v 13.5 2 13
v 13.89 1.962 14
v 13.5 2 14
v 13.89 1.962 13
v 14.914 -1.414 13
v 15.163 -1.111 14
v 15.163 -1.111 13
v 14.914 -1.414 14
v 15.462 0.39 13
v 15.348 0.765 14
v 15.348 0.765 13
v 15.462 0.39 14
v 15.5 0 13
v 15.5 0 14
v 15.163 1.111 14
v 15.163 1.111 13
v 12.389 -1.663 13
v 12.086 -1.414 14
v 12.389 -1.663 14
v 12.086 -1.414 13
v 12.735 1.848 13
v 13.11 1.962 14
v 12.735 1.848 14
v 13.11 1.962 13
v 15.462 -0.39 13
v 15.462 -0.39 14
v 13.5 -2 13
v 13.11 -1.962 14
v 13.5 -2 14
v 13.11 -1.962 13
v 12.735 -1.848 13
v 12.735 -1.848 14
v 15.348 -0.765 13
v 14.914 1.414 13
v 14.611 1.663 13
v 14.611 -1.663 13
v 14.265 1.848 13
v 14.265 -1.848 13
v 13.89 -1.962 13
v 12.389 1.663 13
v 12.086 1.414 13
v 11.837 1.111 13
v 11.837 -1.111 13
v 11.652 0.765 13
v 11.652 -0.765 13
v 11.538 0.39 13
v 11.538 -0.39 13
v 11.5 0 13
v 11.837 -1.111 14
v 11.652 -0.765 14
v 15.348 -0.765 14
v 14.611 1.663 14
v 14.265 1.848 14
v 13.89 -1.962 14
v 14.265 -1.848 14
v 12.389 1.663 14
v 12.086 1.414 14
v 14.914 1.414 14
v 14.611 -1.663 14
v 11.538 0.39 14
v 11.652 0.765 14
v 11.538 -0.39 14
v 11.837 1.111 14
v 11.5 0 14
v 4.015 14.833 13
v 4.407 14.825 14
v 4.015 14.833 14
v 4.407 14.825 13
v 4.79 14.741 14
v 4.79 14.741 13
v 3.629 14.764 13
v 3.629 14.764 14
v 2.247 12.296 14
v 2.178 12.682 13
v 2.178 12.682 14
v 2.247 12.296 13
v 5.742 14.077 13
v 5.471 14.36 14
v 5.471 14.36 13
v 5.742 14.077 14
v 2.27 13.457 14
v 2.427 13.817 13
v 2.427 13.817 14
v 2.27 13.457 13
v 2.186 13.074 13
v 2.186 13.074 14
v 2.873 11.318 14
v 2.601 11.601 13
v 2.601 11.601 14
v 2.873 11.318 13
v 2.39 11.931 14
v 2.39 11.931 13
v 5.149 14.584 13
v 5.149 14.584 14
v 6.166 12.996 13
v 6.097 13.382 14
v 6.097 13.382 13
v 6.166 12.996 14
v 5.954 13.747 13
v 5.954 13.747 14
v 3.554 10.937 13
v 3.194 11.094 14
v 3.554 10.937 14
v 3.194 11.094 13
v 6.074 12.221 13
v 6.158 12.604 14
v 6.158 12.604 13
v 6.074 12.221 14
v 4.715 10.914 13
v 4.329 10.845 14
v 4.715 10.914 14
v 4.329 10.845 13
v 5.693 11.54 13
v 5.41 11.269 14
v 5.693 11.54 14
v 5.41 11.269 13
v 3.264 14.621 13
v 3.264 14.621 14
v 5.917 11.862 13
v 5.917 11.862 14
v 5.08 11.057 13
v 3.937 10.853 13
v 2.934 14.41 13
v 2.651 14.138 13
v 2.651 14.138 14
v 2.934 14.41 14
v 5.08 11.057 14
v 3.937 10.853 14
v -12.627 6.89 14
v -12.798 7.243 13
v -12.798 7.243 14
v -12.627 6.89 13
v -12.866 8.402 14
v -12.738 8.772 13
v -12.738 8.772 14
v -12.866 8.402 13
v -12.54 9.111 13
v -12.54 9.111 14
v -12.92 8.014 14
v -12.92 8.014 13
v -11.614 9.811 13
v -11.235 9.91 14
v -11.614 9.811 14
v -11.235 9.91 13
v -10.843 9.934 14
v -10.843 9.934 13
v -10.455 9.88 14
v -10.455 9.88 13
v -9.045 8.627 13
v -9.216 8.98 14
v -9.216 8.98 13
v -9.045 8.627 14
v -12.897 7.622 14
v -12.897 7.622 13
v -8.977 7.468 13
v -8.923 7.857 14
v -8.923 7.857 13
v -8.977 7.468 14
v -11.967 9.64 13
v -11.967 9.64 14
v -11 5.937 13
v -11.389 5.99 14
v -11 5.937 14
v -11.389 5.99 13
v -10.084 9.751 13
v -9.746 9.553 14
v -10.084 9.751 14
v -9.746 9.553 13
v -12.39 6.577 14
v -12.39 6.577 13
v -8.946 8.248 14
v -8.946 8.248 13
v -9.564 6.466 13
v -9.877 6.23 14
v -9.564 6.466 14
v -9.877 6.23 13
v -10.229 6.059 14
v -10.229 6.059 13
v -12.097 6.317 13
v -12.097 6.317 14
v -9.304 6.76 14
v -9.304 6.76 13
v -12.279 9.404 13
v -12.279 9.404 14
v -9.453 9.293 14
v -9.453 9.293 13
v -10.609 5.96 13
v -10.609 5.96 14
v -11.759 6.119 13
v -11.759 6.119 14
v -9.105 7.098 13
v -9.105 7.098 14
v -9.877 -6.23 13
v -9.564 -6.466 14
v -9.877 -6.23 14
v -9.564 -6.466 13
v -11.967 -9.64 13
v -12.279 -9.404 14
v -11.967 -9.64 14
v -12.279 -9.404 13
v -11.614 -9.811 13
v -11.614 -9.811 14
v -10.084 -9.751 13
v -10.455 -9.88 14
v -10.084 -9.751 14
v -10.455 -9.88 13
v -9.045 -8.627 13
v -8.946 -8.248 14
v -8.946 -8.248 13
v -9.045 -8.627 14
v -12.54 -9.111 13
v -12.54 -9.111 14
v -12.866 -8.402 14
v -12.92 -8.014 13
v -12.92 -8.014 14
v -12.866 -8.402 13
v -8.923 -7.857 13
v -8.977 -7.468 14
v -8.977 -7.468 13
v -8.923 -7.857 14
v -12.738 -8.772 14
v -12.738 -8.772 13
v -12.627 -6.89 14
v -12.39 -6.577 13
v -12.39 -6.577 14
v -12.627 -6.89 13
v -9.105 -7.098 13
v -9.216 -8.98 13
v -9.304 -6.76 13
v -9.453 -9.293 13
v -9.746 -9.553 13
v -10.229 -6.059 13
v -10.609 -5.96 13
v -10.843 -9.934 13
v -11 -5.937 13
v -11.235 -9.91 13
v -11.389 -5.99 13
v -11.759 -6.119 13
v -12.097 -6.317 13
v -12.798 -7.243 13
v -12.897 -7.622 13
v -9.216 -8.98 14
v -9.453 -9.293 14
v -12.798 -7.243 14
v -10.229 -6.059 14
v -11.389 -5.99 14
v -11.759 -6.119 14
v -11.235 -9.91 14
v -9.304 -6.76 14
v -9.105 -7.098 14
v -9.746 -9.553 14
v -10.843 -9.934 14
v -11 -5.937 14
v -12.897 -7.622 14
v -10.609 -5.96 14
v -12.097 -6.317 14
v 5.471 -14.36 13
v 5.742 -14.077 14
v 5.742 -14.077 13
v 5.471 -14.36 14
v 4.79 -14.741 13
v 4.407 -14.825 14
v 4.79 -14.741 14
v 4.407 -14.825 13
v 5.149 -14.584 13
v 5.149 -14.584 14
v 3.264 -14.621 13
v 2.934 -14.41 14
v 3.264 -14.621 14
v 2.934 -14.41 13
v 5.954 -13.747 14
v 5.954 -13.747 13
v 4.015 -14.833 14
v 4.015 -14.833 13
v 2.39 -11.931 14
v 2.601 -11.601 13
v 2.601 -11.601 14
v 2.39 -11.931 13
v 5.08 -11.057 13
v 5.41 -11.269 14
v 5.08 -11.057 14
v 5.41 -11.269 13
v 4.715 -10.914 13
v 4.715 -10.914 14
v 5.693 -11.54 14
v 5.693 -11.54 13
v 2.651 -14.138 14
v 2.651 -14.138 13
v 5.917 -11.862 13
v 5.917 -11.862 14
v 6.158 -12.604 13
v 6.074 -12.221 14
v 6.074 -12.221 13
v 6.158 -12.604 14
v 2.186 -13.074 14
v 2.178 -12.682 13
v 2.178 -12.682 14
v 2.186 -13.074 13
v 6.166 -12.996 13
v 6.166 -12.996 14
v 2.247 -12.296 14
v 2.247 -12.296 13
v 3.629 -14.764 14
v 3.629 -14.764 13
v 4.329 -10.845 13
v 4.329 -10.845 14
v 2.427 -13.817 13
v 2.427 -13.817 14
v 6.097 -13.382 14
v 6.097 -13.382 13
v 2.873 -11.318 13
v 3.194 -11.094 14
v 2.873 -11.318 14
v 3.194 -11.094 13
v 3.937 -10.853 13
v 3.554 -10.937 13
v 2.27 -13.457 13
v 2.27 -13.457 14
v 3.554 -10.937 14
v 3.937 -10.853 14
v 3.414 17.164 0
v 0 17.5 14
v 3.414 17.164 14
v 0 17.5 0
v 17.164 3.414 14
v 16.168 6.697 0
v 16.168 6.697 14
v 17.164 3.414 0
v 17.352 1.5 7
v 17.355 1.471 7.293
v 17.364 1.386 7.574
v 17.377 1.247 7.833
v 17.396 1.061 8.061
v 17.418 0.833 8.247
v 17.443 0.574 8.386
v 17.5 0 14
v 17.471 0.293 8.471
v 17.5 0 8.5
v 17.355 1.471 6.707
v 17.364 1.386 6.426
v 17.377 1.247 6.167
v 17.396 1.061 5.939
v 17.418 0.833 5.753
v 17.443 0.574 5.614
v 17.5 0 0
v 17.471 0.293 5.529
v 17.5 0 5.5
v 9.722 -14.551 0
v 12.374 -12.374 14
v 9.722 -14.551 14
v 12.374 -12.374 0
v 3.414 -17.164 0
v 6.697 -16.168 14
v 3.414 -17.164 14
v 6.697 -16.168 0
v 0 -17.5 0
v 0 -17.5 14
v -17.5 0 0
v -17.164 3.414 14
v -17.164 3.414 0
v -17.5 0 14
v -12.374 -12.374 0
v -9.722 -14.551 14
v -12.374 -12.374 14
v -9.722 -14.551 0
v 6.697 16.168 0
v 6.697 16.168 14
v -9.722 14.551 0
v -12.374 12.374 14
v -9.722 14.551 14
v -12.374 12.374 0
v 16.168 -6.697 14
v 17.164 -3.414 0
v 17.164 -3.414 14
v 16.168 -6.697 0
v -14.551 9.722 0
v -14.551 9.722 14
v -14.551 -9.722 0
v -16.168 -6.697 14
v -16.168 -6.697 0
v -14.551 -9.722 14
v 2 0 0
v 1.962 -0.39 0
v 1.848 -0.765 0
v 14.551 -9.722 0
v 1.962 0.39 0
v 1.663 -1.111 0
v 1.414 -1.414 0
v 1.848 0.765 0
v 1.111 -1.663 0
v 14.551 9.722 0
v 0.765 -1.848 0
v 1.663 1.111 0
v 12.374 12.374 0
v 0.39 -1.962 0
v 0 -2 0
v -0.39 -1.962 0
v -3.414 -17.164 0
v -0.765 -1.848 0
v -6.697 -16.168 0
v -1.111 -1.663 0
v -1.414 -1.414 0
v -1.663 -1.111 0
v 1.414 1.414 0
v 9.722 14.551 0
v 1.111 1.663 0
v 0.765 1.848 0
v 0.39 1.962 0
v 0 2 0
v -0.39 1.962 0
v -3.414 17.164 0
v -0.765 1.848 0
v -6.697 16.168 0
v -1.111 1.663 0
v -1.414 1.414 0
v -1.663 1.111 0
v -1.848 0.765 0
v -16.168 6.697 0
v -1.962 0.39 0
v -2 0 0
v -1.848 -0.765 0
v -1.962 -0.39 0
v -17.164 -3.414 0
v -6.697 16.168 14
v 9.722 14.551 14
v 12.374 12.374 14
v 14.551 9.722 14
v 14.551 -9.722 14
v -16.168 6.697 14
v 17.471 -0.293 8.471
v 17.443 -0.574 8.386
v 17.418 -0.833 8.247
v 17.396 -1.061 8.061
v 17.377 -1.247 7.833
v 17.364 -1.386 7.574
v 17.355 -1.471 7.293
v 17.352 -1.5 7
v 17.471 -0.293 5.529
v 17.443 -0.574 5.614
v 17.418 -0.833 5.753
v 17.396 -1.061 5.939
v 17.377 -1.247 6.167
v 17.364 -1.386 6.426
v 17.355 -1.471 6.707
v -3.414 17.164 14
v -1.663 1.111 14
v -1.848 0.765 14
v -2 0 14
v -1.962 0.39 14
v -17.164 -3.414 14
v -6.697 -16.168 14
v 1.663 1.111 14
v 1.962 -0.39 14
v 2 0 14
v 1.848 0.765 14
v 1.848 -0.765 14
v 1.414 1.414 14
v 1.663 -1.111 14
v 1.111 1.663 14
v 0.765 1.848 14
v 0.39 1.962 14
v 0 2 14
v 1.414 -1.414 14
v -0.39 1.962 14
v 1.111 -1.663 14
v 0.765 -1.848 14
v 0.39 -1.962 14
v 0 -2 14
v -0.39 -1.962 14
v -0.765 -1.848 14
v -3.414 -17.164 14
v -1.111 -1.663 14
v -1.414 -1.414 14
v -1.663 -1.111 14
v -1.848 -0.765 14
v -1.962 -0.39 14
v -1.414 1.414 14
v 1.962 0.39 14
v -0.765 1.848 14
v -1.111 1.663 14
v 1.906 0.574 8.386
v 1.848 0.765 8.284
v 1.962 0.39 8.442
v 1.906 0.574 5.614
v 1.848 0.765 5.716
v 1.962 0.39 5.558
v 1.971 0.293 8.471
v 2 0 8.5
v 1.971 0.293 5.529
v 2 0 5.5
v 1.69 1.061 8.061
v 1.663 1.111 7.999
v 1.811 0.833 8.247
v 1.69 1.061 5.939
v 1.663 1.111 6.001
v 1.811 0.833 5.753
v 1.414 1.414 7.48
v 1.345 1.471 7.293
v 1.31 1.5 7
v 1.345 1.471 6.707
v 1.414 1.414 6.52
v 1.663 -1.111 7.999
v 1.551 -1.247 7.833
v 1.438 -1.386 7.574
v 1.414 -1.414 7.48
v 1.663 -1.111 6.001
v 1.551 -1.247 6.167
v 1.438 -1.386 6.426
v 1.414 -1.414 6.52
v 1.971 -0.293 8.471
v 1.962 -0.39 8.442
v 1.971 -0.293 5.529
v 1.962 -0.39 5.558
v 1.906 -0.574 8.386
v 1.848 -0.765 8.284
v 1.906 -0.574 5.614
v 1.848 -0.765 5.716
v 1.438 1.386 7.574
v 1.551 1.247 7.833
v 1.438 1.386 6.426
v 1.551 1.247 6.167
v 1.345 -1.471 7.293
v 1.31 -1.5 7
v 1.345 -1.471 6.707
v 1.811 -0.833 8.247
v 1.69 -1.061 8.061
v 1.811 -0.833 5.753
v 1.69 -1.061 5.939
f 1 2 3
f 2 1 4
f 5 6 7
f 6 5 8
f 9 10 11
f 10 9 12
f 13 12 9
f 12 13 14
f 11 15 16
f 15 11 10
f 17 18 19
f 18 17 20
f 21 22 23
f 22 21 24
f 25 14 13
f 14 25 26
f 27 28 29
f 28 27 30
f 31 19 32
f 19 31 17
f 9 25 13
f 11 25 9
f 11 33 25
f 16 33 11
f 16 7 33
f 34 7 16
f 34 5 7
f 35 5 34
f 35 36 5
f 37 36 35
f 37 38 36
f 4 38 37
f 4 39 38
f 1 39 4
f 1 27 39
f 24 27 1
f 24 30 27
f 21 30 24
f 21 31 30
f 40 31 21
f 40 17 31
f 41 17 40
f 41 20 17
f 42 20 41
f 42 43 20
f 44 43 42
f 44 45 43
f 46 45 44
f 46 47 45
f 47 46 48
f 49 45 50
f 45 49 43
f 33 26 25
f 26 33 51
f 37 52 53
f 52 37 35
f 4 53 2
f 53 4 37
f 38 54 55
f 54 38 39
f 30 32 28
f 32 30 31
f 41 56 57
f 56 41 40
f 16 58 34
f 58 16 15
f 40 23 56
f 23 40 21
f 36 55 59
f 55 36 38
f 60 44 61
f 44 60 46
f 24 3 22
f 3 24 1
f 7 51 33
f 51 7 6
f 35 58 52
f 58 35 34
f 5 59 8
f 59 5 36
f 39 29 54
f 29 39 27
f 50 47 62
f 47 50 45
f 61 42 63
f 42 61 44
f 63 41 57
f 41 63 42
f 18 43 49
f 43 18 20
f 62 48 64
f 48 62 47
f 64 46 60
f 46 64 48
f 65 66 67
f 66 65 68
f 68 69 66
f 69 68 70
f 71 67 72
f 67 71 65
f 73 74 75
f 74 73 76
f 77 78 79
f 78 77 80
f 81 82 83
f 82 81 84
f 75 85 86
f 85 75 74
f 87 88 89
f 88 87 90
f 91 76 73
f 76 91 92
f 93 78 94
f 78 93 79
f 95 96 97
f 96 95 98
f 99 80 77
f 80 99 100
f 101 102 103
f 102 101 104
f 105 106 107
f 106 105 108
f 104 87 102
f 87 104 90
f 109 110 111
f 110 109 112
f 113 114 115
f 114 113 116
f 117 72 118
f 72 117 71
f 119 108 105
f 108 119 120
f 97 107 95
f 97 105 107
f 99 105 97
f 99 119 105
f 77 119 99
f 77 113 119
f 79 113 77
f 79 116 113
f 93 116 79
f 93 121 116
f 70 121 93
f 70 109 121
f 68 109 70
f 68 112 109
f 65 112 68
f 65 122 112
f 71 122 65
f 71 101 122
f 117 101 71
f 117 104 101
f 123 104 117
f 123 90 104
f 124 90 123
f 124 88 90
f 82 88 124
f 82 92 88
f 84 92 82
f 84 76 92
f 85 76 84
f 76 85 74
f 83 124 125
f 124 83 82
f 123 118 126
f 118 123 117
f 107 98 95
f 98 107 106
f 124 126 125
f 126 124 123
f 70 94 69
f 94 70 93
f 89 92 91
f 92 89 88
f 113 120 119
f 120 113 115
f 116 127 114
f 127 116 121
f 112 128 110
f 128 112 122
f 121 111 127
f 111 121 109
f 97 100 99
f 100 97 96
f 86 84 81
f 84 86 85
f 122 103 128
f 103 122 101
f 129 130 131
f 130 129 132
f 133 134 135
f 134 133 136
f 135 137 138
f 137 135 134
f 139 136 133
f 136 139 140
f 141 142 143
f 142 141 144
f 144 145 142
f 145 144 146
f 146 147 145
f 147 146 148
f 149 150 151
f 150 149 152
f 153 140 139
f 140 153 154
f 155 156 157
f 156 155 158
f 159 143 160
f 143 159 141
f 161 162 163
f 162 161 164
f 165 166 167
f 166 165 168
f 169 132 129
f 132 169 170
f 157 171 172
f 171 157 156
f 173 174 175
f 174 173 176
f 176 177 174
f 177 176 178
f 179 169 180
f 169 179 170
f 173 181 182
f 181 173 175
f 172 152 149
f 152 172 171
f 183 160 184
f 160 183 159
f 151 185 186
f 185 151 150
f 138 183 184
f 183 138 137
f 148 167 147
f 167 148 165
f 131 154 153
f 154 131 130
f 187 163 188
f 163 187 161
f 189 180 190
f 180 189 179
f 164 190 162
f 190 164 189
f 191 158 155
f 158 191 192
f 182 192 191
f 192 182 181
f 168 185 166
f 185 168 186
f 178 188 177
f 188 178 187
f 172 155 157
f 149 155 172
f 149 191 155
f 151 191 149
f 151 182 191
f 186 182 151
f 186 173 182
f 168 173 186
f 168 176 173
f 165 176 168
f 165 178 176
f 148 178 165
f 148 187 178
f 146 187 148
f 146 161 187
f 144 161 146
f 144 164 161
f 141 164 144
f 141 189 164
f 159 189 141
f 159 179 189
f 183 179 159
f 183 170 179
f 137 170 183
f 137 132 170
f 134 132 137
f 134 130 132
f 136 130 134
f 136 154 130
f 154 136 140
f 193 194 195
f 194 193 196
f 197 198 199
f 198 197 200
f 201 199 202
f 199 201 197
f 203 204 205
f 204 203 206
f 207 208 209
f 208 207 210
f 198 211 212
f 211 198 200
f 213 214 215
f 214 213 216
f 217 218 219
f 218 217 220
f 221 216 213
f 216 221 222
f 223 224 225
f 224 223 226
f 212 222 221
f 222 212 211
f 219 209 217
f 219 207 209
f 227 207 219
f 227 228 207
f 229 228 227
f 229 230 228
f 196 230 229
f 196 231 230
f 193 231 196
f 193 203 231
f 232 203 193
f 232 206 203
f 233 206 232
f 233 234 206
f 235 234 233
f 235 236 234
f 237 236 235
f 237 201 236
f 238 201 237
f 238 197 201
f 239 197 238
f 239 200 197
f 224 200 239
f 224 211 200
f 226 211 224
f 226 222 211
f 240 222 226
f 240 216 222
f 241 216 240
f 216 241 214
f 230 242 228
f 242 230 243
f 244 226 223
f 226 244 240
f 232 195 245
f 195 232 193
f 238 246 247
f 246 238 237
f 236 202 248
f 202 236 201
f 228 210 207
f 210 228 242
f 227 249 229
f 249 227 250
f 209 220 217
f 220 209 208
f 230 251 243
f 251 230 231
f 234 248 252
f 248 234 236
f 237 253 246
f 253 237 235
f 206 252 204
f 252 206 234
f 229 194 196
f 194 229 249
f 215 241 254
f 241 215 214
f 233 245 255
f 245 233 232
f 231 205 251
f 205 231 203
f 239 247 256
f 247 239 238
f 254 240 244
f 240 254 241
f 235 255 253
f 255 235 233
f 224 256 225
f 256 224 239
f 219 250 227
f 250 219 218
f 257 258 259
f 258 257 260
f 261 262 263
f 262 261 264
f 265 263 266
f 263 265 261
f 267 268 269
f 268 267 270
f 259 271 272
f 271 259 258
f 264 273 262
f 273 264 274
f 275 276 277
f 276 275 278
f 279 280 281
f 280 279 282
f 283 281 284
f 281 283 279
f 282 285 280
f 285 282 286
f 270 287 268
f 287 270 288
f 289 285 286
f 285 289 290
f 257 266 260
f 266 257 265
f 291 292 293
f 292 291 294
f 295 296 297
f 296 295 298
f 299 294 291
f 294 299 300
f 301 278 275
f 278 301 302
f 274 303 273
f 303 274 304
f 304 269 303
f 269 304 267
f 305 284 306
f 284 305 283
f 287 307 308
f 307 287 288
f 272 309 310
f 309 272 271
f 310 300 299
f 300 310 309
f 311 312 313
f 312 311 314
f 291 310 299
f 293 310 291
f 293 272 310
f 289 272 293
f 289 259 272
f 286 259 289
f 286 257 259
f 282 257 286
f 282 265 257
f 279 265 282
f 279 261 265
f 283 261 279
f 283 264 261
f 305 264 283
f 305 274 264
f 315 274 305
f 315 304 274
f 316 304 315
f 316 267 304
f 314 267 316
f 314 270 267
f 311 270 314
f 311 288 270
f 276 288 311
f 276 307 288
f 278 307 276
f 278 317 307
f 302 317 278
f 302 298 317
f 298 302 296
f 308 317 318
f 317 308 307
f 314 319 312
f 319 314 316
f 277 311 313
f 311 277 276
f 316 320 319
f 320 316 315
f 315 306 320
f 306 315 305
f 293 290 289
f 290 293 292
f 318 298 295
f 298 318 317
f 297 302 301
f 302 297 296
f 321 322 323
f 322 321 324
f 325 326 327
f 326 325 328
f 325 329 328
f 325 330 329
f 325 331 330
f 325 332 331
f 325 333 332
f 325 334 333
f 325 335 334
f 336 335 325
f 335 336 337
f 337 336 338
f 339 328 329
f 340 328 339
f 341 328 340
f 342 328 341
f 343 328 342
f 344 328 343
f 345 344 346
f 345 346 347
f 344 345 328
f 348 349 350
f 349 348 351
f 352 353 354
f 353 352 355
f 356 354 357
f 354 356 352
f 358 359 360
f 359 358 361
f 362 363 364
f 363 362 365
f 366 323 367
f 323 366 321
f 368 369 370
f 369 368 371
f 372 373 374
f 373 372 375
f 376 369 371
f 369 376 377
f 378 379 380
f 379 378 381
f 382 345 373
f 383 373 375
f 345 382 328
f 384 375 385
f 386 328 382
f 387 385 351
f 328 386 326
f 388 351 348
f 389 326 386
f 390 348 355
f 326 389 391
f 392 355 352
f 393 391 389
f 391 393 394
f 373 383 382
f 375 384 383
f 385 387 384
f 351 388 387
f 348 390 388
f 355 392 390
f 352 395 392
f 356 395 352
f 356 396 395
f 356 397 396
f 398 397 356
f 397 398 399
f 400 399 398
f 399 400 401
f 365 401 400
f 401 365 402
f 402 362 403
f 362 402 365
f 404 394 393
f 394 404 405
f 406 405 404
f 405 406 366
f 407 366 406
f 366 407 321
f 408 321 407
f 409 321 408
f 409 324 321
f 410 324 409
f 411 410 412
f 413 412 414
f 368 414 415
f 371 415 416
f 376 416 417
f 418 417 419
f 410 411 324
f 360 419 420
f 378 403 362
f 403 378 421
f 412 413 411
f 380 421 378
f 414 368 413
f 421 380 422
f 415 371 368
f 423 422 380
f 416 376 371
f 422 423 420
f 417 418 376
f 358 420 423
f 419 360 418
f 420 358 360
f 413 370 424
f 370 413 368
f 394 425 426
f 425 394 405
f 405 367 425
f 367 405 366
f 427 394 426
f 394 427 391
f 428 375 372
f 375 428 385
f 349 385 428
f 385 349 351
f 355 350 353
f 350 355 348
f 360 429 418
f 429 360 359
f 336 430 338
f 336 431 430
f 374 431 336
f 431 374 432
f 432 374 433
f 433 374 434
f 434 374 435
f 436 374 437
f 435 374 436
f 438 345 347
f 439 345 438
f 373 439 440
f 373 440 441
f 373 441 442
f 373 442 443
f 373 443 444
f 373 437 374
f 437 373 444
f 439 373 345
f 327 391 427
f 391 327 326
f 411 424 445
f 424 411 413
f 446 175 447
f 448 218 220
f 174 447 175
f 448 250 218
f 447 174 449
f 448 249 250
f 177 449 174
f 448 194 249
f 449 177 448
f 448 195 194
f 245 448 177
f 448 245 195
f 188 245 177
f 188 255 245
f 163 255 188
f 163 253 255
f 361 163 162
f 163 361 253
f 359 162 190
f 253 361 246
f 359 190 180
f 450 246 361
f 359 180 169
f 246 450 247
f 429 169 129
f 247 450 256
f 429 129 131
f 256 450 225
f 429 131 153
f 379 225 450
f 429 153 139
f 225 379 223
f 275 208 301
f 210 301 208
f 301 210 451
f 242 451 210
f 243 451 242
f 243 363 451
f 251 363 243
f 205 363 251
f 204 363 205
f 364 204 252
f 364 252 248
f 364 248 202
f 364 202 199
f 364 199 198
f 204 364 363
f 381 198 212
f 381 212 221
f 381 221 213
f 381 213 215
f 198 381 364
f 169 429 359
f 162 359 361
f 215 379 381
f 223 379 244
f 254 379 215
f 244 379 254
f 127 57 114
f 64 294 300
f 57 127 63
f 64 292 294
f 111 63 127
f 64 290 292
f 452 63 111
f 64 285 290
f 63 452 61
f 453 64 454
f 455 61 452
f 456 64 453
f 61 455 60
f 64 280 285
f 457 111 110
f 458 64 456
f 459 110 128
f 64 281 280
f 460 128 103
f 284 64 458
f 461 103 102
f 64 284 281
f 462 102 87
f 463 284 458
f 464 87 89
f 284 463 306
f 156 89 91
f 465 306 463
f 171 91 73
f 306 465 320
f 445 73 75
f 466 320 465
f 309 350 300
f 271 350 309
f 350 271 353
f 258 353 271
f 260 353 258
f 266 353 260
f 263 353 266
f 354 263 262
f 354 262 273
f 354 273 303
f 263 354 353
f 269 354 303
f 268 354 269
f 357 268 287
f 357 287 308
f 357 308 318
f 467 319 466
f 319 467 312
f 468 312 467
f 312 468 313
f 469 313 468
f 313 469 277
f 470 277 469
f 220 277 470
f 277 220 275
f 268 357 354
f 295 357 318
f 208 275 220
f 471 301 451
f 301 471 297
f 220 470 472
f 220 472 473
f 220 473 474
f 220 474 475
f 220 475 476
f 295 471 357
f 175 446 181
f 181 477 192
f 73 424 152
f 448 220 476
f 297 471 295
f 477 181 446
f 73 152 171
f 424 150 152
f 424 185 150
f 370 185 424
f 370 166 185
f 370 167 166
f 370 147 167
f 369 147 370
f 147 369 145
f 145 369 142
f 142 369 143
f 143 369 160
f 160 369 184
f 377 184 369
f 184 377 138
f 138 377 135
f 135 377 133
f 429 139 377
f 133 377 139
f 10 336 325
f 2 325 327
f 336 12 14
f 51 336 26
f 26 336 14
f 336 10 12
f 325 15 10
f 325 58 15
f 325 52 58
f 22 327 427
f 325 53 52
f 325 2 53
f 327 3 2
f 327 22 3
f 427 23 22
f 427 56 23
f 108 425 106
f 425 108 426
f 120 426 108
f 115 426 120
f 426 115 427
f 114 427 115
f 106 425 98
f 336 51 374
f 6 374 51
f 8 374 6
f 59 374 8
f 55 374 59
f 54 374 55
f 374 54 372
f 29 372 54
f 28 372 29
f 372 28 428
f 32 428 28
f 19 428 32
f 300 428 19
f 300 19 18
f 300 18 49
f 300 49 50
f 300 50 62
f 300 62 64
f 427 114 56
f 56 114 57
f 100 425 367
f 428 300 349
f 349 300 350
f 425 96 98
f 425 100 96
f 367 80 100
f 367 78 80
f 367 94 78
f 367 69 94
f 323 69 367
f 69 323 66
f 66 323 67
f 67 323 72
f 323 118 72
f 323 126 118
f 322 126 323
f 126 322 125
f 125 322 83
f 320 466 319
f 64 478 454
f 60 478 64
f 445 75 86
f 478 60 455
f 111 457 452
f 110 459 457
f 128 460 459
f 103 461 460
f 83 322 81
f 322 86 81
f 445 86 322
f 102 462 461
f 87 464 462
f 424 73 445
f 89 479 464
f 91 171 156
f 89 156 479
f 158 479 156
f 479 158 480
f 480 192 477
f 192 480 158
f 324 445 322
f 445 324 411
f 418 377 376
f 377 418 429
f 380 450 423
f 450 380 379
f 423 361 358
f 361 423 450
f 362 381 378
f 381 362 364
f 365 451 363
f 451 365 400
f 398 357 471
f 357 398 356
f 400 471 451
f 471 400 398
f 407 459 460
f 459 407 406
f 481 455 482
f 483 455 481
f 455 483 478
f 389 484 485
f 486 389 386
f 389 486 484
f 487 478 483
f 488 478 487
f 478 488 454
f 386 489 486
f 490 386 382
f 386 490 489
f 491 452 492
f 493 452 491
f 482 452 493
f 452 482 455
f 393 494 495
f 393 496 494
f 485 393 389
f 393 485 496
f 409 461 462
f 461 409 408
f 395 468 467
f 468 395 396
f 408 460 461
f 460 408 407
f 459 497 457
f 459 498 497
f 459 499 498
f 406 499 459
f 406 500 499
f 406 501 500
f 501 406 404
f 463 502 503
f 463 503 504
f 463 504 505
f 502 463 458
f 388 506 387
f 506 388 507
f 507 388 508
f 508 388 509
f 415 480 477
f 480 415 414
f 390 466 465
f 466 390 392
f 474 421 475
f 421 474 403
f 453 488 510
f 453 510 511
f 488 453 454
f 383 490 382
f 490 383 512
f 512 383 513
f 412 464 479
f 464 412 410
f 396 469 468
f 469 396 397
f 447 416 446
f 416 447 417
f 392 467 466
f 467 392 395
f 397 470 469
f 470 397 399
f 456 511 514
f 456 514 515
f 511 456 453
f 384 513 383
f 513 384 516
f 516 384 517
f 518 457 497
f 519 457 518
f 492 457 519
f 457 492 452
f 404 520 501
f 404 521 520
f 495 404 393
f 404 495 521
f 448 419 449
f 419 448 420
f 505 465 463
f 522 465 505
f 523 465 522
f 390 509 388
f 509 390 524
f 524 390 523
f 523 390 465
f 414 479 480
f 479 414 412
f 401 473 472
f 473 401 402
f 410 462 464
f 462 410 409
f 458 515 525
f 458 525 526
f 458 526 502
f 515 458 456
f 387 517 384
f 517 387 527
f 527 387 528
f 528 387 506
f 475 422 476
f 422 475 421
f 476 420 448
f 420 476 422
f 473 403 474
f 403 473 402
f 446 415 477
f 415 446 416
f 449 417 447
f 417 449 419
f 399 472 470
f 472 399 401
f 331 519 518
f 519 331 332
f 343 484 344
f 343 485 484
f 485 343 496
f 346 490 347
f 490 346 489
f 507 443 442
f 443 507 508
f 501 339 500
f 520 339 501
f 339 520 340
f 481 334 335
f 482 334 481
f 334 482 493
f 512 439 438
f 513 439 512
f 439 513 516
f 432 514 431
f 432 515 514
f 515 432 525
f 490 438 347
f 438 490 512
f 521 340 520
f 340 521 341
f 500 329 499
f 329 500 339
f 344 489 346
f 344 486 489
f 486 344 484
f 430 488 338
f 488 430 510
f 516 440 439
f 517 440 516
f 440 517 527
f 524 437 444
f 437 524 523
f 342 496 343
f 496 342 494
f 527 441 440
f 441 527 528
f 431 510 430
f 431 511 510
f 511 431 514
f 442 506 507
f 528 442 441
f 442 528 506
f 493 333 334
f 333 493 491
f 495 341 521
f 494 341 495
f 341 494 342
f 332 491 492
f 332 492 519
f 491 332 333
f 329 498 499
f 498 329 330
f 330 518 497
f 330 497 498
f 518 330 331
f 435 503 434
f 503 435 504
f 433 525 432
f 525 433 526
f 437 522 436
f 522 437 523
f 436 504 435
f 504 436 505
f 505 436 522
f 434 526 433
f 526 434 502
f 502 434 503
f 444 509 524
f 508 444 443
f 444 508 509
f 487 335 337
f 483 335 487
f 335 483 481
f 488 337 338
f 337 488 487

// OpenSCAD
$fn = 32;

// ----------------------------------------------------------------------
// Control knob: dimpled knob
// ----------------------------------------------------------------------

// --- parameters (mm) ---
dimp_d = 4;               // finger dimple diameter
n_dimp = 5;               // number of dimples
dimp_r = 13.5;            // dimple ring radius
knob_d = 35;              // knob body diameter
knob_h = 14;              // knob body height
bore_d = 4;               // shaft bore diameter
set_d = 3;                // set screw bore diameter
fit_tol = 0.02;           // tolerance for press fits, mm
free_tol = 0.2;           // tolerance for clearance fits, mm

dimp_step = 360 / n_dimp;  // dimple angular step

difference() {
  cylinder(h = knob_h, d = knob_d);
  translate([0, 0, -1]) cylinder(h = knob_h + 2, d = bore_d);
  translate([-1, 0, knob_h / 2]) rotate([0, 90, 0])
    cylinder(h = knob_d / 2 + bore_d / 2 + 2, d = set_d);  for (i = [0 : n_dimp - 1])
    rotate([0, 0, i * dimp_step])
      translate([dimp_r, 0, knob_h - 1])
        cylinder(h = 2, d = dimp_d);
}
